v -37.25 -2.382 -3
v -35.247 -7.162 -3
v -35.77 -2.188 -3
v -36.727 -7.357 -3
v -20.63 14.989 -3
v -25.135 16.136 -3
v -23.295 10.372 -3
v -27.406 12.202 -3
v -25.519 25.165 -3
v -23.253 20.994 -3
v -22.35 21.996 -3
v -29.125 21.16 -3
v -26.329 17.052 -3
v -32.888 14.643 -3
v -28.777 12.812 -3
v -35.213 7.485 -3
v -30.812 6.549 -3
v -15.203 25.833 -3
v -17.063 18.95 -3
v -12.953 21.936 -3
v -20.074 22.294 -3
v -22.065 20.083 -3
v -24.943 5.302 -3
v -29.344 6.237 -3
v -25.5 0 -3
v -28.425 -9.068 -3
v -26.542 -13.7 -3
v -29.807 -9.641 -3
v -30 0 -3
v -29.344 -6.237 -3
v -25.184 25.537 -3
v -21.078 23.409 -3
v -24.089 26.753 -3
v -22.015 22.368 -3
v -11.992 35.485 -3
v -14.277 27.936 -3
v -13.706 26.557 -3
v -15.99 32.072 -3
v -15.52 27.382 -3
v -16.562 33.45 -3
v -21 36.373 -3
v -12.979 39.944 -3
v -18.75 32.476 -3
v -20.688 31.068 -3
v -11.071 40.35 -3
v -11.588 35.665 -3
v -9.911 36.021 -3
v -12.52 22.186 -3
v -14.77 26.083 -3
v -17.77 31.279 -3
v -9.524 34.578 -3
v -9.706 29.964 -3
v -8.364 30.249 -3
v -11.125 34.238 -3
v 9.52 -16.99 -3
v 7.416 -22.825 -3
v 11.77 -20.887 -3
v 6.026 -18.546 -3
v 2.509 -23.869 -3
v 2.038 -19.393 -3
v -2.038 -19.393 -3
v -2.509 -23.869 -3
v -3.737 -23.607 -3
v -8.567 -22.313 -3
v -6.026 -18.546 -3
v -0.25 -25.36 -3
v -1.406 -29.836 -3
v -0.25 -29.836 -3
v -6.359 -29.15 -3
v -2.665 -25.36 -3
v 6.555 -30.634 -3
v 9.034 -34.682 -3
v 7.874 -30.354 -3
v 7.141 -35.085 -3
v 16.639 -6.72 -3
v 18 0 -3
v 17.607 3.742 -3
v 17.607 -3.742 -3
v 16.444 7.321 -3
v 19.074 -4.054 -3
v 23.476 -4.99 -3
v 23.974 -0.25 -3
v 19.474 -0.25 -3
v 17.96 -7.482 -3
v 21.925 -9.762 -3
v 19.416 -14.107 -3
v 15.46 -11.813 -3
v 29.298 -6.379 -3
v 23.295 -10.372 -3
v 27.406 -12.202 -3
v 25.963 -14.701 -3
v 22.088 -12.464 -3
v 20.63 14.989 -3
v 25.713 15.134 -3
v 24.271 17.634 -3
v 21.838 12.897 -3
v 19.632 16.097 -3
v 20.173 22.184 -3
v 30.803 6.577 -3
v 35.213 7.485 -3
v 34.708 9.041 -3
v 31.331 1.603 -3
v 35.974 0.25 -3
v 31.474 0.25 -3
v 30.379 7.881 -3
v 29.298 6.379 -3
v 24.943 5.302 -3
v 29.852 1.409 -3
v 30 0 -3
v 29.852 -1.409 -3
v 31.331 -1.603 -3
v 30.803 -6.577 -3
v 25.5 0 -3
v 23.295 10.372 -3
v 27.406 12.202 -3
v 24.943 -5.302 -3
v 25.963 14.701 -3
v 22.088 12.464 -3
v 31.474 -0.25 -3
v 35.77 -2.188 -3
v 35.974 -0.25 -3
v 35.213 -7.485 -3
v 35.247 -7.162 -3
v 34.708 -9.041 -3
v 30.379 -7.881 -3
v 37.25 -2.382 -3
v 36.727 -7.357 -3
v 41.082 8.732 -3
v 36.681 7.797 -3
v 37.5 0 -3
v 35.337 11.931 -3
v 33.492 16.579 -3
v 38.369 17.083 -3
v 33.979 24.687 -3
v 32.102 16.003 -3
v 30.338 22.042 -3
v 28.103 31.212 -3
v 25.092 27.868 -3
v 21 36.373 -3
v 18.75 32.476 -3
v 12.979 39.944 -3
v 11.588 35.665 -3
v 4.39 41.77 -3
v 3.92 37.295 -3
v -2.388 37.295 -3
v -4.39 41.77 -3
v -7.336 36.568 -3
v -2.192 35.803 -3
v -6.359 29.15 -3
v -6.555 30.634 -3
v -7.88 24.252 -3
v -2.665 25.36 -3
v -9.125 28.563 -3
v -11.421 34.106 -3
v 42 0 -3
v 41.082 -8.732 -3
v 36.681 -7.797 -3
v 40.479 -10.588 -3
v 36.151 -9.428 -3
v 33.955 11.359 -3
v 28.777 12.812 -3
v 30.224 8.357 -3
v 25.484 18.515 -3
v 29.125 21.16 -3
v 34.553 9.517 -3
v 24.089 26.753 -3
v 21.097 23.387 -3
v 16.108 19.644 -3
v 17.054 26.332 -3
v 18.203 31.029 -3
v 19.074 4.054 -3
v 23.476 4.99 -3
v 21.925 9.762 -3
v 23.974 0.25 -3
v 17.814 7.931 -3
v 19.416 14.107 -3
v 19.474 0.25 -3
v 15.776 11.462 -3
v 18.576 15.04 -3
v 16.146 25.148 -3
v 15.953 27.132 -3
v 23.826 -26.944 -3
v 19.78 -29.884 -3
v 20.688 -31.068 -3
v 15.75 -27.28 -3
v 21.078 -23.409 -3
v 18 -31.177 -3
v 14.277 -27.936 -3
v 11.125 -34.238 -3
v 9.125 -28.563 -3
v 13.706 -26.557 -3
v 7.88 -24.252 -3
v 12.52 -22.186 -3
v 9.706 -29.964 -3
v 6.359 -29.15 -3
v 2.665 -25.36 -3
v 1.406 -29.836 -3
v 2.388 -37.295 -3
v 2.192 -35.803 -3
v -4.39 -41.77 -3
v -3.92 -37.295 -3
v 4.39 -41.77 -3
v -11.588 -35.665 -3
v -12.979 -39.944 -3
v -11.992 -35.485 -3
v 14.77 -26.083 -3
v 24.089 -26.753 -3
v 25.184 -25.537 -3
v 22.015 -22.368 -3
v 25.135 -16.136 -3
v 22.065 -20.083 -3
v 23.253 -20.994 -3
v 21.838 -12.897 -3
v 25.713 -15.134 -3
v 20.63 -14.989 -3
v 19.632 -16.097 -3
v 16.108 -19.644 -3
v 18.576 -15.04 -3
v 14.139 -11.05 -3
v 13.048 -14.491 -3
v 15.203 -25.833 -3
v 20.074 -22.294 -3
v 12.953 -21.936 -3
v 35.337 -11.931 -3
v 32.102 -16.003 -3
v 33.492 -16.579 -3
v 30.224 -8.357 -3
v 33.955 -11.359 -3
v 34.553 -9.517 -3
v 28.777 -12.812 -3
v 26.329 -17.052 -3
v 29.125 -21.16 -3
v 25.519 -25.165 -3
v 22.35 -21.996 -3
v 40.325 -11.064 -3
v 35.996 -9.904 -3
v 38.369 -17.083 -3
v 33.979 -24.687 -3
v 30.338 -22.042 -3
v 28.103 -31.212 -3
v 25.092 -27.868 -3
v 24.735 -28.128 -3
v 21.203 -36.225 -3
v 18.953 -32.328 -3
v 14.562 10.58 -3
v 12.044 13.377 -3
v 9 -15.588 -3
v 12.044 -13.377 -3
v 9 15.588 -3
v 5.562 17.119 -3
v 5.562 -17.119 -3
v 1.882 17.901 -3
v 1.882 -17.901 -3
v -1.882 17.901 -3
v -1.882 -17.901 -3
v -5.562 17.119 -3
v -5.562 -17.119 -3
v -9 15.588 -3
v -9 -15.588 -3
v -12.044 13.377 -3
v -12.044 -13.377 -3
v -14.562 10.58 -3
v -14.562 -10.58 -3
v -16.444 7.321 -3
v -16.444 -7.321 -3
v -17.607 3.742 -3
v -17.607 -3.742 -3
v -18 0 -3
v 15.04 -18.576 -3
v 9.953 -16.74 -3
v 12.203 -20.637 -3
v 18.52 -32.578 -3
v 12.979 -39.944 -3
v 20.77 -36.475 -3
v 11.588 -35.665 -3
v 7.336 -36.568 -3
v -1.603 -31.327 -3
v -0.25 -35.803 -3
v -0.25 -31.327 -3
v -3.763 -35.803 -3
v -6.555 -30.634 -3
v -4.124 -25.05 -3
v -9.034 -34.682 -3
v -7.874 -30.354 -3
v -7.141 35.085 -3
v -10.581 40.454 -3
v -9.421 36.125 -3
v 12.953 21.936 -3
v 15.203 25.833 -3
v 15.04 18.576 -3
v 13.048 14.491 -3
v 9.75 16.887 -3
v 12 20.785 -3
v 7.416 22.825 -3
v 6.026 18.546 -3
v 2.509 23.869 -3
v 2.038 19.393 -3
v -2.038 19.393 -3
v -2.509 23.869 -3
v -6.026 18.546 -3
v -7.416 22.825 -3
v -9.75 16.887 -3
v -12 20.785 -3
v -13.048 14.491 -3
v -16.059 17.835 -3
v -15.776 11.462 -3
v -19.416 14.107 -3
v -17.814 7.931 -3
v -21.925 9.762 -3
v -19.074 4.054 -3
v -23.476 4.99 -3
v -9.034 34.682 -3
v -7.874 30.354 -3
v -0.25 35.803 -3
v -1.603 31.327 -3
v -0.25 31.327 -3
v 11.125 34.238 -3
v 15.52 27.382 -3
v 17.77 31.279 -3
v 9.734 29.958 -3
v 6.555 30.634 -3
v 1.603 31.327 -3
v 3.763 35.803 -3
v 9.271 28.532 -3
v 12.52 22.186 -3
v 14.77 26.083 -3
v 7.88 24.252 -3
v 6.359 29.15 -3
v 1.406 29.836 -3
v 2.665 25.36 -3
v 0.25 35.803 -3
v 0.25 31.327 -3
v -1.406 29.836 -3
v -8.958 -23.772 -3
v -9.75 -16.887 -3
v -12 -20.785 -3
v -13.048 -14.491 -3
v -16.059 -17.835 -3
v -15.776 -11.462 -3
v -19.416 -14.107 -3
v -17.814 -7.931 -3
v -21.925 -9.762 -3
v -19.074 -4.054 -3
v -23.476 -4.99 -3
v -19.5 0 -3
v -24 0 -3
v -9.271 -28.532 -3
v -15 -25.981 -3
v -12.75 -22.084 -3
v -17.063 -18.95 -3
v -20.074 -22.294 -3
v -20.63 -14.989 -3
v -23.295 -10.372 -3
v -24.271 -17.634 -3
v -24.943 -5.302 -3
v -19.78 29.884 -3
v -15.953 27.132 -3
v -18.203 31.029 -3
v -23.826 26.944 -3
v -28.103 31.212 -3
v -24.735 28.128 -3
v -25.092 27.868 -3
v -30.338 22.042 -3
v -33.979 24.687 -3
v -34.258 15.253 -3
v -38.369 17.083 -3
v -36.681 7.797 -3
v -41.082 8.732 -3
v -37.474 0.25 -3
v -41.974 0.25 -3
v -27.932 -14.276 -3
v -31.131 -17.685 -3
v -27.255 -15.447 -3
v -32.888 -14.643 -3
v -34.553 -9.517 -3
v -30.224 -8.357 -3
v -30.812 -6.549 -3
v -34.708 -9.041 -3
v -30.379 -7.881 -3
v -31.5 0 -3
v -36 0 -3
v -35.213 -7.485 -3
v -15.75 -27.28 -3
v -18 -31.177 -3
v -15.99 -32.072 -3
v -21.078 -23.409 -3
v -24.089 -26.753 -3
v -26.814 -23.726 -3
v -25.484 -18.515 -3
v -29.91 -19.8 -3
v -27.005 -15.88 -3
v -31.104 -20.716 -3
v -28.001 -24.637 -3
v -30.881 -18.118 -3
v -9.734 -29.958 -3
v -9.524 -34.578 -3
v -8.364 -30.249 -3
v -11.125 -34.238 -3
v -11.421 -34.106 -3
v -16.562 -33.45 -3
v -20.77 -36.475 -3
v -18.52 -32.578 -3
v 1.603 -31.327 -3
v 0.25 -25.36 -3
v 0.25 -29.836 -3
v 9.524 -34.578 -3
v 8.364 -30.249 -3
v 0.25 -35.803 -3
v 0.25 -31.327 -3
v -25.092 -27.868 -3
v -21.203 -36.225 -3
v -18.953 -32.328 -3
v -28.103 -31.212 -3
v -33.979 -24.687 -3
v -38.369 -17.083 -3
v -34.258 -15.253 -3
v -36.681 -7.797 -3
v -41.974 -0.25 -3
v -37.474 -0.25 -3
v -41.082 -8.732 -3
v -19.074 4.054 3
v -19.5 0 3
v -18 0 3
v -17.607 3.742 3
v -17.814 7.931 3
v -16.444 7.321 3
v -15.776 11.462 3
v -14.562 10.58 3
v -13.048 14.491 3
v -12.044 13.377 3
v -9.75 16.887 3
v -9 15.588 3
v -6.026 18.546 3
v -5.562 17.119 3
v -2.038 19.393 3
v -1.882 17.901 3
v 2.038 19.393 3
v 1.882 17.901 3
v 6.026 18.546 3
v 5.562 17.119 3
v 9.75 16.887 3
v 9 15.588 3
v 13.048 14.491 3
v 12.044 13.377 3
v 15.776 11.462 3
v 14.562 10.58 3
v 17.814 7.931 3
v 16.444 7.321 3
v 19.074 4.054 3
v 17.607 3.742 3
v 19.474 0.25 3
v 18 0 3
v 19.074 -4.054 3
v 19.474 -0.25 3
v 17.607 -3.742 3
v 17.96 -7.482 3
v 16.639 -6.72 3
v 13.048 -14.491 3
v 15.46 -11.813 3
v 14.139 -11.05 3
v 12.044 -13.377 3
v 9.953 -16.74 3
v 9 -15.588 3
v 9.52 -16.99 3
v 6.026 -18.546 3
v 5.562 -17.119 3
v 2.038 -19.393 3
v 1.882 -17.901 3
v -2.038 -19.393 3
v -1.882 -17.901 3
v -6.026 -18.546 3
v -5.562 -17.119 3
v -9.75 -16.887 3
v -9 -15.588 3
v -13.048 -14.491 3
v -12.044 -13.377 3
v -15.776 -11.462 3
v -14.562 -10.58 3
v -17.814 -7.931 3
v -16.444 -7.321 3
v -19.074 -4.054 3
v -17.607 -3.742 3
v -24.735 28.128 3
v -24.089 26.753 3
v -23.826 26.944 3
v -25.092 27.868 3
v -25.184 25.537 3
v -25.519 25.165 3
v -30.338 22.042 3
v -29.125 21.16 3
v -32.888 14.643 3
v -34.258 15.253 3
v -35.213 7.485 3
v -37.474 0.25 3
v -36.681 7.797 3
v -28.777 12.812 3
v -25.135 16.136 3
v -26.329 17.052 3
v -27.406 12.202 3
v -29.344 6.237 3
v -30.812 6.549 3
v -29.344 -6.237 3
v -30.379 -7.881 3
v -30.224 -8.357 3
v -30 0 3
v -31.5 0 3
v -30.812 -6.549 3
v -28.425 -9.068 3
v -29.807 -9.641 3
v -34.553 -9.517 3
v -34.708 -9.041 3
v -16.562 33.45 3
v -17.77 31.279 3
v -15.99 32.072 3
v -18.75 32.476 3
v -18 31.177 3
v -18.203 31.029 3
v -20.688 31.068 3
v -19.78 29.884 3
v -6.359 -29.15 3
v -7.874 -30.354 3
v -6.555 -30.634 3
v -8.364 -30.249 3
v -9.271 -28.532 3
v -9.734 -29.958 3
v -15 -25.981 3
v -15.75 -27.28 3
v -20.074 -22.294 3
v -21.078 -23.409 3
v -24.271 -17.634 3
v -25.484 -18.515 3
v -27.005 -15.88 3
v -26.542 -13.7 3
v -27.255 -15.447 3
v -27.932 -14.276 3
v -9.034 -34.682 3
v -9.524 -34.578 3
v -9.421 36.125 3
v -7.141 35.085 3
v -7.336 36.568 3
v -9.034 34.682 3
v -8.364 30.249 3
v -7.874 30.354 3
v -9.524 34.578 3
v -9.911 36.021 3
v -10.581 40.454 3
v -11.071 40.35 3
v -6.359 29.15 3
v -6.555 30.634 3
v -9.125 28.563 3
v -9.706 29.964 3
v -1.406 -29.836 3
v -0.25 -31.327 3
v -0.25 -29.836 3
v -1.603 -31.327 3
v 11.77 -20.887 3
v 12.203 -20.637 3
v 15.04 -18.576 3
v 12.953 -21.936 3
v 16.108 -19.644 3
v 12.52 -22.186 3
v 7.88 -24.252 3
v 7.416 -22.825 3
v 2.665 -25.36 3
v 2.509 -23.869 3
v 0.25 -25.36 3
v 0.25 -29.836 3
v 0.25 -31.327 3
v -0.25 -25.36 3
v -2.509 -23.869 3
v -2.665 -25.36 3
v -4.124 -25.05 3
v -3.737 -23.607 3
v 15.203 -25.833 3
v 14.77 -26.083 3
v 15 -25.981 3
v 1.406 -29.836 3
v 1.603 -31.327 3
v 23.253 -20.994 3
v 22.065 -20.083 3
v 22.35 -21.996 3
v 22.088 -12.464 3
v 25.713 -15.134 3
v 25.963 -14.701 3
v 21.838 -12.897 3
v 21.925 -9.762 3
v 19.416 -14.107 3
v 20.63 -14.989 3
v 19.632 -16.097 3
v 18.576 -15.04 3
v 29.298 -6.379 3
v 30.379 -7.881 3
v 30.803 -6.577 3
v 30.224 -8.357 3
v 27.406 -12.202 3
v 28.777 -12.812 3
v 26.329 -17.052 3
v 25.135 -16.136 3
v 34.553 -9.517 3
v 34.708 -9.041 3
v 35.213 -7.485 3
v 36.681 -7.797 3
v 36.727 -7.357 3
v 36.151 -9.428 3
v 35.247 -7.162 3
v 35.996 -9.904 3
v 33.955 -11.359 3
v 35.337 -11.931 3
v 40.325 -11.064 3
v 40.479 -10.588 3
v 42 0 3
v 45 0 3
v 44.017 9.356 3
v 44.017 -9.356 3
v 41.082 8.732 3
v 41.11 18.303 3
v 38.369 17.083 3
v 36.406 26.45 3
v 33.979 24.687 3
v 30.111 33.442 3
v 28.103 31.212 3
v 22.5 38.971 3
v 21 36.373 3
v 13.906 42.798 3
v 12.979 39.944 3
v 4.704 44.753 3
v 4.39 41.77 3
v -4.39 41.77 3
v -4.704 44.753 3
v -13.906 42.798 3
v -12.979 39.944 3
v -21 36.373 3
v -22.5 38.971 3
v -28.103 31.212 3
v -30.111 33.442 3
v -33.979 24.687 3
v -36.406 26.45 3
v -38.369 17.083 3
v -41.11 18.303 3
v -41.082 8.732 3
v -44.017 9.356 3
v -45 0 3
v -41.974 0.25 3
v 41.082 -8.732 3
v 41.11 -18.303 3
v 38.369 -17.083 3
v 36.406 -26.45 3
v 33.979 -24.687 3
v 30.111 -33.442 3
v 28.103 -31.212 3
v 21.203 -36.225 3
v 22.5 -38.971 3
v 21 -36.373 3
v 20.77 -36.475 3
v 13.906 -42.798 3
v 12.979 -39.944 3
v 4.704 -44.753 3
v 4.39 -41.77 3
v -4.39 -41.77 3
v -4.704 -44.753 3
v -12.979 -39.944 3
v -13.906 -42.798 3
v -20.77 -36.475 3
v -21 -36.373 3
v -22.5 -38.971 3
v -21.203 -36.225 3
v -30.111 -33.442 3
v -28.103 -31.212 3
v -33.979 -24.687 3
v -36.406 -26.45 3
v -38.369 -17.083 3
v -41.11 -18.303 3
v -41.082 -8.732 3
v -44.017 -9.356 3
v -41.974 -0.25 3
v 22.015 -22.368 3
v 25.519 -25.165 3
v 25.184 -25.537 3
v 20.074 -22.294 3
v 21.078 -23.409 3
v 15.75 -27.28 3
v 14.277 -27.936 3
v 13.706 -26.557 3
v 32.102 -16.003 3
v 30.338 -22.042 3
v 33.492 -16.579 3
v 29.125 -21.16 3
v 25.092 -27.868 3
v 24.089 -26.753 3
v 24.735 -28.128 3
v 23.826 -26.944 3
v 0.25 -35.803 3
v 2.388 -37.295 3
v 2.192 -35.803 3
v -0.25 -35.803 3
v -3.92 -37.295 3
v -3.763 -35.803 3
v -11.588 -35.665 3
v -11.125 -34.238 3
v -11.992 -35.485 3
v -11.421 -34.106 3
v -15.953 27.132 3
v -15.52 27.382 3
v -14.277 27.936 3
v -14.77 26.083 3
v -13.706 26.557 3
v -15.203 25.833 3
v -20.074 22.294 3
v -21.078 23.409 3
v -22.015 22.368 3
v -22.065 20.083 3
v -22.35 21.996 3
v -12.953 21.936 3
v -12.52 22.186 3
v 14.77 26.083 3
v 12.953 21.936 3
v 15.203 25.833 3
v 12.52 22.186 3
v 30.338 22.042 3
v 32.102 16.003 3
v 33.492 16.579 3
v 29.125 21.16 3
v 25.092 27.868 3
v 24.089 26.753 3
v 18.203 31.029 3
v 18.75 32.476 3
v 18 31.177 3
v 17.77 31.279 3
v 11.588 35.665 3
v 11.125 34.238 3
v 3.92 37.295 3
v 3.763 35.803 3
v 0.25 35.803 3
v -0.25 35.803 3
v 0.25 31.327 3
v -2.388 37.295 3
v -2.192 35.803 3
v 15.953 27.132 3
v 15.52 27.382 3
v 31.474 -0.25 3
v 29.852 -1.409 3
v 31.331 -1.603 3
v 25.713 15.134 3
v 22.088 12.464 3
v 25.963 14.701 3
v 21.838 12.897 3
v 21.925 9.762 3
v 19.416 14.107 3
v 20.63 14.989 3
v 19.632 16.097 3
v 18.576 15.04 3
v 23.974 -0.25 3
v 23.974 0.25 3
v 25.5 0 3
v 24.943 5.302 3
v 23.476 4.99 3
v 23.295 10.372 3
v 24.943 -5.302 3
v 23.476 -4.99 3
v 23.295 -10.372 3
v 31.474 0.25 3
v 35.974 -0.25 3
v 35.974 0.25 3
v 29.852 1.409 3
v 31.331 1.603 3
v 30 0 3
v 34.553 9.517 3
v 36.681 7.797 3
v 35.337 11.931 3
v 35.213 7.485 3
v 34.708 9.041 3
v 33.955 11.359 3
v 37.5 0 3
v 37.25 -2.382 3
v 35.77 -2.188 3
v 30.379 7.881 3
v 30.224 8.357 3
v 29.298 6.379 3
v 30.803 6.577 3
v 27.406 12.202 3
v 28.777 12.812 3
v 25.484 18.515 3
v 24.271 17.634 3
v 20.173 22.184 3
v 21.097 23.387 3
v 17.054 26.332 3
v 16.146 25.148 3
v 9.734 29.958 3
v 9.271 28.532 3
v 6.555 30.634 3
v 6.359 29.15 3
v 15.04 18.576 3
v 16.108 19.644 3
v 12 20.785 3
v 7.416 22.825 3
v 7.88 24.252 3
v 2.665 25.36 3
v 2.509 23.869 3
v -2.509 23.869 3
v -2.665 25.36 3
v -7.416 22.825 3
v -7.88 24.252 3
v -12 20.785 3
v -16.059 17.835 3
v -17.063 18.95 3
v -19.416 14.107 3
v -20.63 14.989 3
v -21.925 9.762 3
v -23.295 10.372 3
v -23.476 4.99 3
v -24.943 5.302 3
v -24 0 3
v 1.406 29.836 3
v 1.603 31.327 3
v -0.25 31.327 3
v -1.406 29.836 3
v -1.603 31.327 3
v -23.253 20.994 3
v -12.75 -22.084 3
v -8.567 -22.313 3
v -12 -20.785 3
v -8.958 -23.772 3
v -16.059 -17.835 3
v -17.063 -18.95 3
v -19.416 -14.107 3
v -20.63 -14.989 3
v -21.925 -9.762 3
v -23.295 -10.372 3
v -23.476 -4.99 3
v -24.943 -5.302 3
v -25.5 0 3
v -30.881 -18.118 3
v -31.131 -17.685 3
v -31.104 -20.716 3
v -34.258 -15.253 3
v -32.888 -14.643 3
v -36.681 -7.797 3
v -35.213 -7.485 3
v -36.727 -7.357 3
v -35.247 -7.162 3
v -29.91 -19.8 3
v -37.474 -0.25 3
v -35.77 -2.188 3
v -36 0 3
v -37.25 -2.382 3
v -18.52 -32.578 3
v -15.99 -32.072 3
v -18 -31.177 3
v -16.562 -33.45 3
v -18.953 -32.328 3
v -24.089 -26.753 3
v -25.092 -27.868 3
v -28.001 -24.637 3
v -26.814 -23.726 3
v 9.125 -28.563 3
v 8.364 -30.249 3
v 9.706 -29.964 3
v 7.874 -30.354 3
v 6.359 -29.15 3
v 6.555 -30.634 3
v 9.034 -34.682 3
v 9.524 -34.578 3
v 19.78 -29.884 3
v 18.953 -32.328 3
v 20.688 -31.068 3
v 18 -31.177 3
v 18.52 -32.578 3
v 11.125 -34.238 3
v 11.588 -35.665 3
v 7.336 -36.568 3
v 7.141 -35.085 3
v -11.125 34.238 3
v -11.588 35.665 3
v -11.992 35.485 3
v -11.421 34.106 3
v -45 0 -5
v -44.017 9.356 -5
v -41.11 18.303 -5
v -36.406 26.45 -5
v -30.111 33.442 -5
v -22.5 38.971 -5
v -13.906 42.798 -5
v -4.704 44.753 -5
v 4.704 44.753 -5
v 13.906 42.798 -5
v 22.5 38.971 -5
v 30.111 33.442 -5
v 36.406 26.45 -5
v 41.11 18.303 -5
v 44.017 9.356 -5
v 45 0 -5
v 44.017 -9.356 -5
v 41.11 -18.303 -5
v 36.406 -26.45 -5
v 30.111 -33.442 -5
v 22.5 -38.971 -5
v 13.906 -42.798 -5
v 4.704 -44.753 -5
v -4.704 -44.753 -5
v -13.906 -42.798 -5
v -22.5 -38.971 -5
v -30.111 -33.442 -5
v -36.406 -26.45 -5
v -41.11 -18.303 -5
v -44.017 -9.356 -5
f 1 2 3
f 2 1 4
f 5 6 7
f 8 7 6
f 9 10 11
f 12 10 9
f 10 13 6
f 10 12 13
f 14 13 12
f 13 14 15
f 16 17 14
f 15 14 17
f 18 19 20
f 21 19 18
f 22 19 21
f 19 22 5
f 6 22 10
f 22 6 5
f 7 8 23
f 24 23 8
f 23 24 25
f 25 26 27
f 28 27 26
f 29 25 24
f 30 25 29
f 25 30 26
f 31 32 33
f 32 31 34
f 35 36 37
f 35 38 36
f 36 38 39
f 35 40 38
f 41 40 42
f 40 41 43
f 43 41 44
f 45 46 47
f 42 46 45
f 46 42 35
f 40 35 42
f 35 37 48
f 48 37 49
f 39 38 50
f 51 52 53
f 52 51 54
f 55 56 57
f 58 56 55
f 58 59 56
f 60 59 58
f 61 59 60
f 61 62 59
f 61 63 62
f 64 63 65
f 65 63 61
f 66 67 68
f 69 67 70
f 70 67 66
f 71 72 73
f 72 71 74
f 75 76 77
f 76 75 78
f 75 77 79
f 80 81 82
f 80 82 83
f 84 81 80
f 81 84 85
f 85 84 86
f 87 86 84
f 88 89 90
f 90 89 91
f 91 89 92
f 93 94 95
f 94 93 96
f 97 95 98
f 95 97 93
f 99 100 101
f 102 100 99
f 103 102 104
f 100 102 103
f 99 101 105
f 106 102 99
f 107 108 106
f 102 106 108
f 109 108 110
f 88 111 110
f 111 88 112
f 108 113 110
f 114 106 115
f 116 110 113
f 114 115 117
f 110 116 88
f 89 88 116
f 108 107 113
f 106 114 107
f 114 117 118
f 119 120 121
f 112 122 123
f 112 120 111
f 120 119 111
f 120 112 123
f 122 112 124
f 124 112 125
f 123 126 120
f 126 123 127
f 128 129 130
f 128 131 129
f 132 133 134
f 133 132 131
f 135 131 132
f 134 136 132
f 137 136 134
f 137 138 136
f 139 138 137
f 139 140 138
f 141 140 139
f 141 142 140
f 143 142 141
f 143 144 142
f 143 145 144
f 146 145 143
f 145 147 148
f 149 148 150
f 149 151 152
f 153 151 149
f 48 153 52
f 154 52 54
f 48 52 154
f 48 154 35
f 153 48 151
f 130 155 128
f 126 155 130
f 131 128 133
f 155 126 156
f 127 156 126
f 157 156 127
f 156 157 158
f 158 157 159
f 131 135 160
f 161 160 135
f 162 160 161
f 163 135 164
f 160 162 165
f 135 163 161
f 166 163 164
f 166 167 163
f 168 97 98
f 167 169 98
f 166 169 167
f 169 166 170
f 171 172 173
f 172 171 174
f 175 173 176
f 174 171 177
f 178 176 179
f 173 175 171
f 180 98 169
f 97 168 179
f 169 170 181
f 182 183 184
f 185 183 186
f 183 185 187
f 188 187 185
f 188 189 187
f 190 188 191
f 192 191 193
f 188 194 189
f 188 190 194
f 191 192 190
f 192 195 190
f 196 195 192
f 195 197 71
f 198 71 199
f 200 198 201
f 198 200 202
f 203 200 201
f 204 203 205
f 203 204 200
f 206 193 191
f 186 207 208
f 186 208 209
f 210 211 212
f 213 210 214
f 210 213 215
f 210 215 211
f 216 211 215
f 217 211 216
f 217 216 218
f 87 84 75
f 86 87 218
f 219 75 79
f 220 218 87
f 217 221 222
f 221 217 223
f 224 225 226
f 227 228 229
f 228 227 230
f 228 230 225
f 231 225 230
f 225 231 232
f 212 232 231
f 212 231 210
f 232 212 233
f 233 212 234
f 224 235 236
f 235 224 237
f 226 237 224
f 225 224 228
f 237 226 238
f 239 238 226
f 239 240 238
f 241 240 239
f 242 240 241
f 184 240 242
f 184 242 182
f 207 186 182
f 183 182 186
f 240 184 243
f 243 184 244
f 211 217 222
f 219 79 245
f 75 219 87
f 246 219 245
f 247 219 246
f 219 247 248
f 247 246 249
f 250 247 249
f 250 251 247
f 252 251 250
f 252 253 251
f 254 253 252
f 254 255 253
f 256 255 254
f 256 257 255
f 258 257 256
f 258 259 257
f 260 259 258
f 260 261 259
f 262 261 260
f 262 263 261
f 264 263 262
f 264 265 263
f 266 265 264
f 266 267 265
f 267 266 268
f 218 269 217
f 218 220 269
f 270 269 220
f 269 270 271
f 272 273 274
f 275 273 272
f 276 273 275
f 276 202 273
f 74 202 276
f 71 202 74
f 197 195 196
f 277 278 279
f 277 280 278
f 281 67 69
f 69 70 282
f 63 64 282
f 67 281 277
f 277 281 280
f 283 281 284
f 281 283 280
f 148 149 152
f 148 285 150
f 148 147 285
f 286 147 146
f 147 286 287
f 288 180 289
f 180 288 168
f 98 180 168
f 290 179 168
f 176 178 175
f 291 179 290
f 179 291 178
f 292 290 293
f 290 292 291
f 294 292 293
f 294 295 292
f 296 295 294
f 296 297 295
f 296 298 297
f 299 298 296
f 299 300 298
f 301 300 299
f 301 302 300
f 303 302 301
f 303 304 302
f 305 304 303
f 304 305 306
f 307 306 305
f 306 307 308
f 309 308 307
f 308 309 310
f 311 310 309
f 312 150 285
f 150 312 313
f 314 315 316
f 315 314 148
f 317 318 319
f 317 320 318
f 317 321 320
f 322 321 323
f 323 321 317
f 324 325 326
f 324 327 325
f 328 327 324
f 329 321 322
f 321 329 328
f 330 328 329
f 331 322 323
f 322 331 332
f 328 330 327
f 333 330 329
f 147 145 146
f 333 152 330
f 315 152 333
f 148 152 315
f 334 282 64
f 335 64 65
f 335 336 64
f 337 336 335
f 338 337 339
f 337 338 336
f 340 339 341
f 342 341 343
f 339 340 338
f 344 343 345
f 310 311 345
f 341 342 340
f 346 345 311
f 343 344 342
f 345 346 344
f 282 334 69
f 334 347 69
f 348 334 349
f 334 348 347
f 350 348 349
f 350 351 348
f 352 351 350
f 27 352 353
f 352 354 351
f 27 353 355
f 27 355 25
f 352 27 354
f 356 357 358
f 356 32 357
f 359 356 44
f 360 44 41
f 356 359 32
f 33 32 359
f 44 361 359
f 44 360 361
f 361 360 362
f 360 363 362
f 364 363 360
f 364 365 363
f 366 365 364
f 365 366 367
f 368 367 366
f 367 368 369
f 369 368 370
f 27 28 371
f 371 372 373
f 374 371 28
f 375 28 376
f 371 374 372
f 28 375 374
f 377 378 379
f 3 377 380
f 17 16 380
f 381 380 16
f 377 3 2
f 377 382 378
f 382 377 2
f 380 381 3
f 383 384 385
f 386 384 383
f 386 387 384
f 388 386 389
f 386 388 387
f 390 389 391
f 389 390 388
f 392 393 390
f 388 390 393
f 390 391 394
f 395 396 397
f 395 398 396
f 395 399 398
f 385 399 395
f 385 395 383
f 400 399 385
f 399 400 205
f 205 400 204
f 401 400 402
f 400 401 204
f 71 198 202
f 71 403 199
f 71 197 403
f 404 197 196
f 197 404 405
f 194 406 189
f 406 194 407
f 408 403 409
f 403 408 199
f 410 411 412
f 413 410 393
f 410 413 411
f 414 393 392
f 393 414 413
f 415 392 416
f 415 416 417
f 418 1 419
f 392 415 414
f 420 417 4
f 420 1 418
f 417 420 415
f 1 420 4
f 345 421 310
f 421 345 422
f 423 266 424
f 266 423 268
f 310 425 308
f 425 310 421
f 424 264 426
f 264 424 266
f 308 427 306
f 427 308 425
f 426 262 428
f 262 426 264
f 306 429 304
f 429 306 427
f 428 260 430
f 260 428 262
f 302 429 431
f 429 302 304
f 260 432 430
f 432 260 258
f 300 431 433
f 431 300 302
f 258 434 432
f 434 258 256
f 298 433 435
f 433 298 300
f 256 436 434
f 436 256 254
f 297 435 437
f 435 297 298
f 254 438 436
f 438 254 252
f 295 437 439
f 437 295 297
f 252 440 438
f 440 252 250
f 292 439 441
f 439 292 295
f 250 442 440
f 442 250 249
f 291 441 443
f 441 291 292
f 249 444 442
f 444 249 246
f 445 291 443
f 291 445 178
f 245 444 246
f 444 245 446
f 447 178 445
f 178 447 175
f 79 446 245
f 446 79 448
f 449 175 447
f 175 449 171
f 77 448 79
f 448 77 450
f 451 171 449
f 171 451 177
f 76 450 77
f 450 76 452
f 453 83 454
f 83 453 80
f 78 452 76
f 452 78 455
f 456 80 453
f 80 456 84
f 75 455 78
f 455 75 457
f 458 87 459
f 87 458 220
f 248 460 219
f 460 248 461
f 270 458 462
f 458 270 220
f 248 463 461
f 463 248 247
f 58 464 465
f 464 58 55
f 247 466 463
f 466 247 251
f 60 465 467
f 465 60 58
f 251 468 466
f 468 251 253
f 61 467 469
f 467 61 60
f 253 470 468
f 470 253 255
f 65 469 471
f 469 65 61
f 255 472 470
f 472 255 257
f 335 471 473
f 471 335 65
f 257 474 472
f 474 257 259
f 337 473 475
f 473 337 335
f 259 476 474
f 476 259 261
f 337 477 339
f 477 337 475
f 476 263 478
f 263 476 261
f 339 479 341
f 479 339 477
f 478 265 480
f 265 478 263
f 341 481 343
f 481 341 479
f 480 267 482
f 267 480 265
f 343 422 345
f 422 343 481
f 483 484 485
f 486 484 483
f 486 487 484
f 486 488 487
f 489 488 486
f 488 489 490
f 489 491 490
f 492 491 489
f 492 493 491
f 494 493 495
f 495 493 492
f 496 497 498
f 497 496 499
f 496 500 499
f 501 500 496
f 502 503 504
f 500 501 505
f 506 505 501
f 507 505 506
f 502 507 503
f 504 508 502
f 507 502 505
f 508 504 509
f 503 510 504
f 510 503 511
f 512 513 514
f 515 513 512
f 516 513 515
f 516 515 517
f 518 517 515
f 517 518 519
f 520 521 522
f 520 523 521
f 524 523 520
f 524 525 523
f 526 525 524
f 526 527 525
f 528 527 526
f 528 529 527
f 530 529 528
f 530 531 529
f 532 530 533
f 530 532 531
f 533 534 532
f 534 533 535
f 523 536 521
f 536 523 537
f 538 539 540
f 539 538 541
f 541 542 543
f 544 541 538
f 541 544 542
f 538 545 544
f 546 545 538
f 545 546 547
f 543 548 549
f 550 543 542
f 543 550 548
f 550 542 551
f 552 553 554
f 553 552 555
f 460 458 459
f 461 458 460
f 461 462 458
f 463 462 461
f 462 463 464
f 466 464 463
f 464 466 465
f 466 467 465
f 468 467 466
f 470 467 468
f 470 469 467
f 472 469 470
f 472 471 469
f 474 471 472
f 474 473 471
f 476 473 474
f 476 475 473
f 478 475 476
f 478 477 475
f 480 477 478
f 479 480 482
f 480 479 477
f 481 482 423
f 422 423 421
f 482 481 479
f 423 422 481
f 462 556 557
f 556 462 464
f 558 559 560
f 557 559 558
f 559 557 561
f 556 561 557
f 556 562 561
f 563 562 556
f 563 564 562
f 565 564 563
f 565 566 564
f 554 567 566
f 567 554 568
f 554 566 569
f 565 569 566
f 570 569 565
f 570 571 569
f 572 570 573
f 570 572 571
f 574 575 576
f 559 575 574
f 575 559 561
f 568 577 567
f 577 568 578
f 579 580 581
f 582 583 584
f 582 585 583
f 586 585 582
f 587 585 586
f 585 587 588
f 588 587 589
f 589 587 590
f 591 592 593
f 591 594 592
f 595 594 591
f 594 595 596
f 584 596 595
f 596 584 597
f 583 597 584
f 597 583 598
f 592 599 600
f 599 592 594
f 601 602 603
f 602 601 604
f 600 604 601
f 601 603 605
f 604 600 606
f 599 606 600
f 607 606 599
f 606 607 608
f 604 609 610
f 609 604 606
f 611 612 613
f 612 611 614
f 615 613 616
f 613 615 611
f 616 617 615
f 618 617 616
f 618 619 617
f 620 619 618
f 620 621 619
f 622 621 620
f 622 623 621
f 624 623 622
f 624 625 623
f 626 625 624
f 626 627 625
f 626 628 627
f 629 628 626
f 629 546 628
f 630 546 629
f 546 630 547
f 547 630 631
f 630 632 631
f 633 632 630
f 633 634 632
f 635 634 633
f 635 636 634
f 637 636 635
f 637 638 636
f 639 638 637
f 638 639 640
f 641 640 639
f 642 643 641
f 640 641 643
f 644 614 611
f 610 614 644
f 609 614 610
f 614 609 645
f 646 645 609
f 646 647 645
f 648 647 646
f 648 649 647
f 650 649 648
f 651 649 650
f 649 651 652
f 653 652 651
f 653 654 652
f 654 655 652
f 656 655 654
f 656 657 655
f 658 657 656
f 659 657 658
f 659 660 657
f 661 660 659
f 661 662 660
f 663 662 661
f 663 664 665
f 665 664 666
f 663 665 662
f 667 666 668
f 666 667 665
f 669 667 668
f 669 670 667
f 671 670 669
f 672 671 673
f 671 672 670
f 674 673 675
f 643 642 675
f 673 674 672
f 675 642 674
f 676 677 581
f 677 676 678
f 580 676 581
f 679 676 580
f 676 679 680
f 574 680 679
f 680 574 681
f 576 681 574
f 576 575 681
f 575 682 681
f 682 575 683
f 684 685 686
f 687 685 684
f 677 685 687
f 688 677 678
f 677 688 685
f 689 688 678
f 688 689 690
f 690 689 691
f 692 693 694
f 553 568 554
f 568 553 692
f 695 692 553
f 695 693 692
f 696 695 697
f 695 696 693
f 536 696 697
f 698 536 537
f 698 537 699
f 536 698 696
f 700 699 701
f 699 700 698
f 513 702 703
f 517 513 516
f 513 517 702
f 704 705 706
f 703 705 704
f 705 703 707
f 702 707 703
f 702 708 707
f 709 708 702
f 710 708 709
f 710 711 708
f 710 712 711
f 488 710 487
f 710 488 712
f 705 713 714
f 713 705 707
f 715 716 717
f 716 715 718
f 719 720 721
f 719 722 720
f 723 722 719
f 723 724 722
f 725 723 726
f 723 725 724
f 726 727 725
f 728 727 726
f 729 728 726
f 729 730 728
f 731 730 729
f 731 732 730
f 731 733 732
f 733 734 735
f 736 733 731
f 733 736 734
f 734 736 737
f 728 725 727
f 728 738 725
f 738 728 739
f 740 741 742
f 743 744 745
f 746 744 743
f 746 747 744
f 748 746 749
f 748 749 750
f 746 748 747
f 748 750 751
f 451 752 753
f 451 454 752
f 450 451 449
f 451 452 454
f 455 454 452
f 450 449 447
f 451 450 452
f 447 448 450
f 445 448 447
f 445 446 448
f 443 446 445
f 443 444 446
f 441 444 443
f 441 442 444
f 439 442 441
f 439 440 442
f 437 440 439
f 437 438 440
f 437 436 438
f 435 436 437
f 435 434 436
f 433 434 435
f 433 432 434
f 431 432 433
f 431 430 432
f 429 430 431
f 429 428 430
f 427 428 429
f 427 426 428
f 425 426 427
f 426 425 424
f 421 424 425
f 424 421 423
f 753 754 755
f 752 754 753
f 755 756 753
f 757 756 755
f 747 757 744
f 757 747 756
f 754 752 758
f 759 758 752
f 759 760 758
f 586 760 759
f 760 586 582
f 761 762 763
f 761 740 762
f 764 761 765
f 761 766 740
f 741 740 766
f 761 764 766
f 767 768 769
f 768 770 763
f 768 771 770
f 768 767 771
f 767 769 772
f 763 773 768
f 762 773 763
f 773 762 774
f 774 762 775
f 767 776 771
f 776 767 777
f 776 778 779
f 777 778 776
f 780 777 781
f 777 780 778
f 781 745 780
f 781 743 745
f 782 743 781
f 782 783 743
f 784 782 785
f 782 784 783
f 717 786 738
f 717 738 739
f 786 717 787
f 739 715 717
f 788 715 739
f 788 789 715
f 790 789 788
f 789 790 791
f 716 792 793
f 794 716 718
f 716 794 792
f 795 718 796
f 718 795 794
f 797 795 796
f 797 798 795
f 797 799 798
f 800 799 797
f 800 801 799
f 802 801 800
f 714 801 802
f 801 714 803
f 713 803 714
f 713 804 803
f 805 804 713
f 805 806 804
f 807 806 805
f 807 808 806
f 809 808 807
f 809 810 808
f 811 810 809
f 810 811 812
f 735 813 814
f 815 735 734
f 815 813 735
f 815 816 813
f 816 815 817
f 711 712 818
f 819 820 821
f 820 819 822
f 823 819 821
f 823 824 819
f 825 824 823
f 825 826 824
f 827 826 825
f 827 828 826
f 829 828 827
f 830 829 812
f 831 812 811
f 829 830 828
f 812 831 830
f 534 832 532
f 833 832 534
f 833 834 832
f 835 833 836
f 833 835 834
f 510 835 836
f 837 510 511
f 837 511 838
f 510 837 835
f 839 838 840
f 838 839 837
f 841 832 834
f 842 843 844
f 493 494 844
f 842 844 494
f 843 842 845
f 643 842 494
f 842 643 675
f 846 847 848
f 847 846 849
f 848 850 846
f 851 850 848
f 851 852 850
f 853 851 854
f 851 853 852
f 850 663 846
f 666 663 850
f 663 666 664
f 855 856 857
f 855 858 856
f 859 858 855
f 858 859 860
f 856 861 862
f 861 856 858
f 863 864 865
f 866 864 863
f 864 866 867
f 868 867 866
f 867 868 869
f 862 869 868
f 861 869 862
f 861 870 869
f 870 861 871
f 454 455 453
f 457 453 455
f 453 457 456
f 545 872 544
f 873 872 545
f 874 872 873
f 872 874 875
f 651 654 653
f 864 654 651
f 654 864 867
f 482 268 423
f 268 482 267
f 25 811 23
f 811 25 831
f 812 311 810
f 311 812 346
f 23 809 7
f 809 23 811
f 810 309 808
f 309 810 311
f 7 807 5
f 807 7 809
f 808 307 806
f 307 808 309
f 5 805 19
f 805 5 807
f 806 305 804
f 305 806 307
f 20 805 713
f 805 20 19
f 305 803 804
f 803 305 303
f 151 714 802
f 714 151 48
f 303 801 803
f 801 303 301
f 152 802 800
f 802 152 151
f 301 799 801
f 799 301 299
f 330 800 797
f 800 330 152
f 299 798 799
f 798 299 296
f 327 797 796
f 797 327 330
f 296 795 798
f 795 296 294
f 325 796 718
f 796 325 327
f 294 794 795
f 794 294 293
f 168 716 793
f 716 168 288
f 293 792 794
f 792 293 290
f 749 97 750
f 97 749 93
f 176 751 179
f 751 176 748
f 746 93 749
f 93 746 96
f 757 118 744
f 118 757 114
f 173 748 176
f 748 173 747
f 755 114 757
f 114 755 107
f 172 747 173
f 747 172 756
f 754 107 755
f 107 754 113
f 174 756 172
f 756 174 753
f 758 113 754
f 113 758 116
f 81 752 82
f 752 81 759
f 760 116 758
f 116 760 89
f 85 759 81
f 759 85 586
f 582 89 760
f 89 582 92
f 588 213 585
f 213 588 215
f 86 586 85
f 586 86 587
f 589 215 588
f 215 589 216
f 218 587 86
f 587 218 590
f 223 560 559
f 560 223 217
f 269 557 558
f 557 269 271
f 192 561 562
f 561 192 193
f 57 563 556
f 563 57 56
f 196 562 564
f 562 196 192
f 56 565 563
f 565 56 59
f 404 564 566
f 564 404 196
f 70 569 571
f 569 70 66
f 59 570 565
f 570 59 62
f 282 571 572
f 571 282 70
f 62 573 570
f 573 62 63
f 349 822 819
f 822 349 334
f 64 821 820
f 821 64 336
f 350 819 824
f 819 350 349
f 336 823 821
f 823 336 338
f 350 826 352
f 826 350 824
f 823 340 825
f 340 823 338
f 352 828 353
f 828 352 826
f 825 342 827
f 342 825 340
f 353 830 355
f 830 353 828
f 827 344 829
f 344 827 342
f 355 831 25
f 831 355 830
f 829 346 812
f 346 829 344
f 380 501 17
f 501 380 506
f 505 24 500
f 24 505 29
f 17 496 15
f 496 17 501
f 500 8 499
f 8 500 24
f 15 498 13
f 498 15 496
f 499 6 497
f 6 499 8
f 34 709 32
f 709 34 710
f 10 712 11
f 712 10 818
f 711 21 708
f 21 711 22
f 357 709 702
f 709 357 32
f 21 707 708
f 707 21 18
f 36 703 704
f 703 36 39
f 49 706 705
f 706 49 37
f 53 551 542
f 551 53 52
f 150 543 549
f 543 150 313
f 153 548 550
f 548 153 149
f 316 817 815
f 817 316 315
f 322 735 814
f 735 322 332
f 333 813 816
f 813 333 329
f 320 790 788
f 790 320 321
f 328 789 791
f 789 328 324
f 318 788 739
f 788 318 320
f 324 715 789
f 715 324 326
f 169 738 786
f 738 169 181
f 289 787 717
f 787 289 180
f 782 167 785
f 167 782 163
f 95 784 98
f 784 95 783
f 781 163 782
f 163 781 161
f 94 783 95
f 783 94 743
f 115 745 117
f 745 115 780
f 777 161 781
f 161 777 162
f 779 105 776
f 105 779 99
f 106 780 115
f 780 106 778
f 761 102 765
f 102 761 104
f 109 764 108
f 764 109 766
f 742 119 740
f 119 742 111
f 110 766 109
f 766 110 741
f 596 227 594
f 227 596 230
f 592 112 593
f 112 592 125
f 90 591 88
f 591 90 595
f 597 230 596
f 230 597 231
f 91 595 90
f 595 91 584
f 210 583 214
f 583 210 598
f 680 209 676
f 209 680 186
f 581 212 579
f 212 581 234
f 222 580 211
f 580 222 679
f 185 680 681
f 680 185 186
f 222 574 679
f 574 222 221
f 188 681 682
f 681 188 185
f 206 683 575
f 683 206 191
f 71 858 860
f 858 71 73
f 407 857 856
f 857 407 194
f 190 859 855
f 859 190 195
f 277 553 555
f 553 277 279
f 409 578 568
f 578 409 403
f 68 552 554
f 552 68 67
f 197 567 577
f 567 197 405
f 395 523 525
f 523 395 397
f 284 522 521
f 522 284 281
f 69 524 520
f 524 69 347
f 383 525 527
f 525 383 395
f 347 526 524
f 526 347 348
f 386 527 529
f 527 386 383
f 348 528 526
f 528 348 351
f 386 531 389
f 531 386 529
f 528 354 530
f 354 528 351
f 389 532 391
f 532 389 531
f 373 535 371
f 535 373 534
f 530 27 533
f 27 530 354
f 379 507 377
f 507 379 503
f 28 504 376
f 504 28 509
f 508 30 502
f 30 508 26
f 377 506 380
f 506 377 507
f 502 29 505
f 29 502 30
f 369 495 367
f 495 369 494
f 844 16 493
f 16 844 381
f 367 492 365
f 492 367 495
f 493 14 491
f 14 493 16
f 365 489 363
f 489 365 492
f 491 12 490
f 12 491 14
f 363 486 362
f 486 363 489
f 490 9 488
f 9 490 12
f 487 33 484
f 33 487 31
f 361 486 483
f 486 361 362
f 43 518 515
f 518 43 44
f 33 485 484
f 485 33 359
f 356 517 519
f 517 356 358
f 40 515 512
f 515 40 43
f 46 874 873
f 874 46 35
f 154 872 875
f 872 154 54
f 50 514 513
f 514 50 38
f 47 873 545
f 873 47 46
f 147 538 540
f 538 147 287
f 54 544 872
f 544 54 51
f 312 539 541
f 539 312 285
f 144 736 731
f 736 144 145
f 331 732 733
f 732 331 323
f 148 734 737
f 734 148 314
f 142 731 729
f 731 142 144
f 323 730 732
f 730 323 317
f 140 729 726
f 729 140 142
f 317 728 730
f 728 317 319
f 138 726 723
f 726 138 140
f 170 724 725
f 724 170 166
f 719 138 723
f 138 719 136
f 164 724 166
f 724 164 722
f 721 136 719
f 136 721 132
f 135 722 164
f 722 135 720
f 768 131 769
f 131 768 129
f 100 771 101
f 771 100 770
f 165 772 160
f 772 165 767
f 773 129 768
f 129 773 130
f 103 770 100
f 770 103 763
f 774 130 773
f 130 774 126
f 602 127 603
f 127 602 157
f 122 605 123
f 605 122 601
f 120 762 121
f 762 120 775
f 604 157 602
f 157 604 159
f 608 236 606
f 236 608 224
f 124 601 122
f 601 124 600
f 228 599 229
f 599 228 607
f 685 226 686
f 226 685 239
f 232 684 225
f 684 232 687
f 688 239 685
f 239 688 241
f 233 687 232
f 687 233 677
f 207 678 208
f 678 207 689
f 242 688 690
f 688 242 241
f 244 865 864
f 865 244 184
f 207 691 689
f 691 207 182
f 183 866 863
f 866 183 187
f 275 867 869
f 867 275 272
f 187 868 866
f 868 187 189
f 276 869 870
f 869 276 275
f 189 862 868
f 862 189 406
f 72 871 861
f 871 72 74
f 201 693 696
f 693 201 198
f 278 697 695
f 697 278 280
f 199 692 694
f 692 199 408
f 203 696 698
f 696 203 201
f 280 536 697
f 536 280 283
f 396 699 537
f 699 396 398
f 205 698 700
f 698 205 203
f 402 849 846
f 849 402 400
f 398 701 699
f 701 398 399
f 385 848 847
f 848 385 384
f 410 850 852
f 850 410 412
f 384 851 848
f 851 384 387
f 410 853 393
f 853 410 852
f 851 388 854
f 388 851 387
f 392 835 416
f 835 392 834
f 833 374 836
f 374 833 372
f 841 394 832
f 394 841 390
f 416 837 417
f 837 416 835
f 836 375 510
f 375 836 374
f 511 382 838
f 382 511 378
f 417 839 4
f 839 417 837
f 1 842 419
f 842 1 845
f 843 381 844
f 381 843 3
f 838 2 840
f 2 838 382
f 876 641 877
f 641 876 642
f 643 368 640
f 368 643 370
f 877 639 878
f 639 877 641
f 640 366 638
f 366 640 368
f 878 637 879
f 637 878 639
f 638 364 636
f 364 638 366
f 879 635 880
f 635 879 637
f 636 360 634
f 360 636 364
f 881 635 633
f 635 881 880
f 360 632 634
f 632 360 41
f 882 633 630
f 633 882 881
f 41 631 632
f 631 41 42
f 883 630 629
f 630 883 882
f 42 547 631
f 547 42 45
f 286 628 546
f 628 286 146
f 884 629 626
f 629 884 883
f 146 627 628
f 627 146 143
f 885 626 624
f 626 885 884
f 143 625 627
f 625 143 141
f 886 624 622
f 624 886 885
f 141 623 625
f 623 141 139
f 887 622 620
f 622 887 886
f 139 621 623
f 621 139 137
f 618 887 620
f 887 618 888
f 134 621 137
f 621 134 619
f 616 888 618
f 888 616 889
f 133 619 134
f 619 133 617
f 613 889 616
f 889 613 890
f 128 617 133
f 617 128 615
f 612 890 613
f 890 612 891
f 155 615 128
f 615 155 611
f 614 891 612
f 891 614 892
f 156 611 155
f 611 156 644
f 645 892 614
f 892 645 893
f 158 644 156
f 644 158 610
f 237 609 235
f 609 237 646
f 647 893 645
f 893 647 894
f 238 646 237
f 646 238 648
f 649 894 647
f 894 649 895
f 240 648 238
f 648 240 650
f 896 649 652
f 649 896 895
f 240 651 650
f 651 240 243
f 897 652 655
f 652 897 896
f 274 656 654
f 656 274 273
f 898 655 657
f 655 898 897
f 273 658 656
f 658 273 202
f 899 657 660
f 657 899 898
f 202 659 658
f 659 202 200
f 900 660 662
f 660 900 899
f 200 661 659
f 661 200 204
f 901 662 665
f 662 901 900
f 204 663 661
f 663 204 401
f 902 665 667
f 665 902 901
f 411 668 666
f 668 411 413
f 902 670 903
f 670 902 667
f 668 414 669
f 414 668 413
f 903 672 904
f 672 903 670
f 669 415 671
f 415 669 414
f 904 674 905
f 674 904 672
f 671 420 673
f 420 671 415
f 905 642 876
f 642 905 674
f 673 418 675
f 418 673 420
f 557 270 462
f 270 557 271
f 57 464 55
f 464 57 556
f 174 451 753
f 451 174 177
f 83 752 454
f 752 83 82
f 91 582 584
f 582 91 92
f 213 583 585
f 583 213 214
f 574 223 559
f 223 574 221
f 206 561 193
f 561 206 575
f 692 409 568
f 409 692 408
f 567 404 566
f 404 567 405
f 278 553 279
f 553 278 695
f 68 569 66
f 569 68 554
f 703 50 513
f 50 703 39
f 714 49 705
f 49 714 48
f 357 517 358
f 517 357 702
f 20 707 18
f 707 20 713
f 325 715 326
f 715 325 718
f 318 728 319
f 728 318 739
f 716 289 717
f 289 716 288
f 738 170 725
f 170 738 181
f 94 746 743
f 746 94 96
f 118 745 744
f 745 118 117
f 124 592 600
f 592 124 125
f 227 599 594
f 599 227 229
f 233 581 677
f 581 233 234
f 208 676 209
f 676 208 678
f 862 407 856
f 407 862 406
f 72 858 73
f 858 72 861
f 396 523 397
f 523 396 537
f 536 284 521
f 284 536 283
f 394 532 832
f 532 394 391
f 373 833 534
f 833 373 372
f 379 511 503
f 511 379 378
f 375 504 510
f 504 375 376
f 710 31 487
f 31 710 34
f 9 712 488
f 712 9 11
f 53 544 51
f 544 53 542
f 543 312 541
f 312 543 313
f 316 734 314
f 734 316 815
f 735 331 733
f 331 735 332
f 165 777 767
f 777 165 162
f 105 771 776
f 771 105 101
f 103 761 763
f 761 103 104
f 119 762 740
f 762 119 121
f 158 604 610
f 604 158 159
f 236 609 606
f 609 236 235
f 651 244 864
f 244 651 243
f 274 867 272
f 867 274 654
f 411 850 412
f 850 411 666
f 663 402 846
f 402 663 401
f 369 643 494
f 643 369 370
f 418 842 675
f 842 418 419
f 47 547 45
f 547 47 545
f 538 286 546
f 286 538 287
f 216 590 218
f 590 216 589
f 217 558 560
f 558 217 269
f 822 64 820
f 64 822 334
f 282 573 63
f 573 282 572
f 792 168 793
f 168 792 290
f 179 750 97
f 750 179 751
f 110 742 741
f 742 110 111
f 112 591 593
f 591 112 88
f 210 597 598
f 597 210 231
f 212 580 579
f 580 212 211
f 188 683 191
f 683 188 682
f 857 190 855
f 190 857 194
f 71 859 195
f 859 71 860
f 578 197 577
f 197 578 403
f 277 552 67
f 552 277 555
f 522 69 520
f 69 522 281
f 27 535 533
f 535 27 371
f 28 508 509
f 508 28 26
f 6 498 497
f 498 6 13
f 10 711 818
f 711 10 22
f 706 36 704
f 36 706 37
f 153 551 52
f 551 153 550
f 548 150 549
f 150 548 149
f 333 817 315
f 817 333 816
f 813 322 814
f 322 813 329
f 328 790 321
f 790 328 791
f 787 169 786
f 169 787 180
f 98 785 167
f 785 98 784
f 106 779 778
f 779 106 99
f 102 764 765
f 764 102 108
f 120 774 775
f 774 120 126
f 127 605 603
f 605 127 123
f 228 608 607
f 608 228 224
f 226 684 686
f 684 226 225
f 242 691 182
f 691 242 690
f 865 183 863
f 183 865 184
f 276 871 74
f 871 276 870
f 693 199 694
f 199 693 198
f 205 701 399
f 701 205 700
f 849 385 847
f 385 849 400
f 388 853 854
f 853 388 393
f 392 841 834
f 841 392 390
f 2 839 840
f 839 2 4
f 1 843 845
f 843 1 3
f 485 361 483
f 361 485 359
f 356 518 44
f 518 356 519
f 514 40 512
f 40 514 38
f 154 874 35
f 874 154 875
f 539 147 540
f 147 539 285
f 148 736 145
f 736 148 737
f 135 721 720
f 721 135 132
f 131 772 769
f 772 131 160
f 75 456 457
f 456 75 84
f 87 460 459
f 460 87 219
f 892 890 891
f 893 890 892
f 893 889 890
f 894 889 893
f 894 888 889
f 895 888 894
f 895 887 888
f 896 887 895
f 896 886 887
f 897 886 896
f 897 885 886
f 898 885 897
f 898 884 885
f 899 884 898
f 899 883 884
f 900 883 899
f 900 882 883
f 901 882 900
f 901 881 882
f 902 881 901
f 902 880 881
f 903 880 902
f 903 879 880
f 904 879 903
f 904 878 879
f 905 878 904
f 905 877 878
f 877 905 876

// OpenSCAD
// file: demo/demo-circle-maze-data.scad
// code generated circle maze data
rings=5;
ringHeight=6;
ringThickness=1.5;
ringCutWidth=5;
outerThickness=3;
innerRadius=6;
middleRadius=18;
middleHole=false;
spokeWidth=0.5;
hasFloor=true;
floorHeight=2;
ringData = [
//  [ringId,size,W0,C0,W1,C1,...]
// W = 0, cut spoke
// C = 0, cut inner wall
	[0,1,1,1],
	[1,6,1,0,0,1,0,1,0,1,0,1,1,1],
	[2,12,1,1,1,0,1,1,0,0,0,1,0,1,0,1,1,1,0,1,1,1,1,0,0,1],
	[3,24,1,0,0,1,1,0,0,1,1,0,1,0,1,0,0,1,0,1,1,1,1,0,0,1,0,1,0,1,1,0,1,1,1,0,1,0,0,0,1,1,0,0,0,1,1,1,1,0],
	[4,24,1,0,0,0,0,1,1,0,0,1,0,0,0,1,1,0,0,1,0,0,0,1,1,0,0,1,0,1,0,1,0,0,1,0,0,0,0,1,0,1,0,1,0,1,0,0,0,1]
];
// main file
// Author: Mitch Allen
// File: maze-circle.scad

include <demo/demo-circle-maze-data.scad>


ringColor = [1,0,0];
function spokeColor(i) = i ? ( i == 1 ? "green": "red") : "blue";
function cutColor(i) = i ? ( i == 1 ? "green": "black") : "blue";
floorColor = "white";

// innerRadius = 6;
// middleRadius = 18;
// ringThickness = 1.5;
// outerThickness = ringThickness * 2;
// floorHeight = 2;
// ringHeight = 6;
// ringCutWidth = 5;
// spokeWidth = 0.5; // The width of the spokes

// middleHole = true;
// hasFloor = true;

spokeHeight = ringHeight; // The height (along the Z axis) of the spokes
ringCutHeight = ringHeight * 2; // to remove slivers

module drawMazeFloor() {
    
    if( hasFloor ) {
        // If hole in middle
        innerDiameter = middleHole ? innerRadius * 2 : 0;
    
        // thickness = (ringId != len(ringData)) ? ringThickness : ringThickness * 2;
    
        thickness = ringThickness 
            + innerRadius * (len(ringData)-1)
            + outerThickness - ringThickness
            + (middleHole ? 0 : middleRadius);
    
        yPos = 0 - floorHeight / 2 - ringHeight / 2;
      
        color(floorColor) 
            rotate_extrude() 
                // translate([(middleRadius)+(thickness/2),yPos,0]) 
                translate([(middleHole ? middleRadius : 0)+(thickness/2),yPos,0])
                square([thickness,floorHeight],center=true);
    }
}

module drawRing(ringId) {
    
    // innerDiameter = ringId * innerRadius * 2;
    innerDiameter = middleRadius * 2 + ( ringId - 1 ) * innerRadius * 2;
    
    thickness = (ringId != len(ringData)) ? ringThickness : outerThickness;
    
      
    color(ringColor) 
        rotate_extrude() 
            translate([(innerDiameter/2)+(thickness/2),0,0]) 
            square([thickness,ringHeight],center=true);
}

module drawRings() {
    
    for( i = [1 : rings]) {
        drawRing(i);
    }
}

module drawMazePanel() {
        
   drawRings();
    
   for(el = [1:len(ringData)-1]) {
       // start at one, skip ring 0 (center)
       rd = ringData[el];
       ringId = rd[0];
       arms = rd[1];
       // drawSpokes(rd, innerRadius, (ringId * innerRadius) );
       
       drawSpokes(rd, innerRadius, (middleRadius + (ringId - 1) * innerRadius) );
    }
}

module drawSpokes(rd,armLength=5,fromCenter=5) {
    ringId = rd[0];
    arms = rd[1];
    union()  // Union isn't strictly necessary because everything at the top level is implicitly unioned
    { 
        for (i=[0:arms-1]) {
                color(spokeColor(i))
                rotate([0,0,-360/arms*(i + 1)]) // Rotate the arm after it's centered
                translate([fromCenter,-spokeWidth/2,-spokeHeight/2]) // Center the arm around the X axis
                cube([armLength * rd[i * 2 + 2], spokeWidth, spokeHeight]); // 
            }
    } 
}

module cutSpokes(rd,armLength=5,fromCenter=5) {
    ringId = rd[0];
    arms = rd[1];
    
    padding = 0.9;
    
    cutCenter = fromCenter - ringThickness / 2;
 
    union() 
    { 
        rotate([0,0,-360/arms*0.5])  // offset from spokes
        for (i=[0:arms-1]) 
                color(cutColor(i))
                rotate([0,0,-360/arms*i]) // Rotate the arm after it's centered
                translate([cutCenter,-ringCutWidth/2,-ringCutHeight/2]) // Center the arm around the X axis
                cube(
                    [(padding + ringThickness) * (rd[ i * 2 + 3 ] ? 0 : 1), 
                    ringCutWidth, 
                    ringCutHeight * 2]
                );
    } 
}

module cutRings() {

    
   for(el = [1:len(ringData)-1]) {
       // start at one, skip ring 0 (center)
       rd = ringData[el];
       ringId = rd[0];
       arms = rd[1];
       armLength = innerRadius;
       // fromCenter = (ringId * innerRadius) - innerRadius * 0.5;
       fromCenter = middleRadius + ((ringId-1) * innerRadius);
       cutSpokes(rd,armLength, fromCenter );
    }
}


module main() {
    union() {
        
        difference() {
        // union() {
            drawMazePanel();
            cutRings();
        }
        drawMazeFloor();
    }
}

main();
